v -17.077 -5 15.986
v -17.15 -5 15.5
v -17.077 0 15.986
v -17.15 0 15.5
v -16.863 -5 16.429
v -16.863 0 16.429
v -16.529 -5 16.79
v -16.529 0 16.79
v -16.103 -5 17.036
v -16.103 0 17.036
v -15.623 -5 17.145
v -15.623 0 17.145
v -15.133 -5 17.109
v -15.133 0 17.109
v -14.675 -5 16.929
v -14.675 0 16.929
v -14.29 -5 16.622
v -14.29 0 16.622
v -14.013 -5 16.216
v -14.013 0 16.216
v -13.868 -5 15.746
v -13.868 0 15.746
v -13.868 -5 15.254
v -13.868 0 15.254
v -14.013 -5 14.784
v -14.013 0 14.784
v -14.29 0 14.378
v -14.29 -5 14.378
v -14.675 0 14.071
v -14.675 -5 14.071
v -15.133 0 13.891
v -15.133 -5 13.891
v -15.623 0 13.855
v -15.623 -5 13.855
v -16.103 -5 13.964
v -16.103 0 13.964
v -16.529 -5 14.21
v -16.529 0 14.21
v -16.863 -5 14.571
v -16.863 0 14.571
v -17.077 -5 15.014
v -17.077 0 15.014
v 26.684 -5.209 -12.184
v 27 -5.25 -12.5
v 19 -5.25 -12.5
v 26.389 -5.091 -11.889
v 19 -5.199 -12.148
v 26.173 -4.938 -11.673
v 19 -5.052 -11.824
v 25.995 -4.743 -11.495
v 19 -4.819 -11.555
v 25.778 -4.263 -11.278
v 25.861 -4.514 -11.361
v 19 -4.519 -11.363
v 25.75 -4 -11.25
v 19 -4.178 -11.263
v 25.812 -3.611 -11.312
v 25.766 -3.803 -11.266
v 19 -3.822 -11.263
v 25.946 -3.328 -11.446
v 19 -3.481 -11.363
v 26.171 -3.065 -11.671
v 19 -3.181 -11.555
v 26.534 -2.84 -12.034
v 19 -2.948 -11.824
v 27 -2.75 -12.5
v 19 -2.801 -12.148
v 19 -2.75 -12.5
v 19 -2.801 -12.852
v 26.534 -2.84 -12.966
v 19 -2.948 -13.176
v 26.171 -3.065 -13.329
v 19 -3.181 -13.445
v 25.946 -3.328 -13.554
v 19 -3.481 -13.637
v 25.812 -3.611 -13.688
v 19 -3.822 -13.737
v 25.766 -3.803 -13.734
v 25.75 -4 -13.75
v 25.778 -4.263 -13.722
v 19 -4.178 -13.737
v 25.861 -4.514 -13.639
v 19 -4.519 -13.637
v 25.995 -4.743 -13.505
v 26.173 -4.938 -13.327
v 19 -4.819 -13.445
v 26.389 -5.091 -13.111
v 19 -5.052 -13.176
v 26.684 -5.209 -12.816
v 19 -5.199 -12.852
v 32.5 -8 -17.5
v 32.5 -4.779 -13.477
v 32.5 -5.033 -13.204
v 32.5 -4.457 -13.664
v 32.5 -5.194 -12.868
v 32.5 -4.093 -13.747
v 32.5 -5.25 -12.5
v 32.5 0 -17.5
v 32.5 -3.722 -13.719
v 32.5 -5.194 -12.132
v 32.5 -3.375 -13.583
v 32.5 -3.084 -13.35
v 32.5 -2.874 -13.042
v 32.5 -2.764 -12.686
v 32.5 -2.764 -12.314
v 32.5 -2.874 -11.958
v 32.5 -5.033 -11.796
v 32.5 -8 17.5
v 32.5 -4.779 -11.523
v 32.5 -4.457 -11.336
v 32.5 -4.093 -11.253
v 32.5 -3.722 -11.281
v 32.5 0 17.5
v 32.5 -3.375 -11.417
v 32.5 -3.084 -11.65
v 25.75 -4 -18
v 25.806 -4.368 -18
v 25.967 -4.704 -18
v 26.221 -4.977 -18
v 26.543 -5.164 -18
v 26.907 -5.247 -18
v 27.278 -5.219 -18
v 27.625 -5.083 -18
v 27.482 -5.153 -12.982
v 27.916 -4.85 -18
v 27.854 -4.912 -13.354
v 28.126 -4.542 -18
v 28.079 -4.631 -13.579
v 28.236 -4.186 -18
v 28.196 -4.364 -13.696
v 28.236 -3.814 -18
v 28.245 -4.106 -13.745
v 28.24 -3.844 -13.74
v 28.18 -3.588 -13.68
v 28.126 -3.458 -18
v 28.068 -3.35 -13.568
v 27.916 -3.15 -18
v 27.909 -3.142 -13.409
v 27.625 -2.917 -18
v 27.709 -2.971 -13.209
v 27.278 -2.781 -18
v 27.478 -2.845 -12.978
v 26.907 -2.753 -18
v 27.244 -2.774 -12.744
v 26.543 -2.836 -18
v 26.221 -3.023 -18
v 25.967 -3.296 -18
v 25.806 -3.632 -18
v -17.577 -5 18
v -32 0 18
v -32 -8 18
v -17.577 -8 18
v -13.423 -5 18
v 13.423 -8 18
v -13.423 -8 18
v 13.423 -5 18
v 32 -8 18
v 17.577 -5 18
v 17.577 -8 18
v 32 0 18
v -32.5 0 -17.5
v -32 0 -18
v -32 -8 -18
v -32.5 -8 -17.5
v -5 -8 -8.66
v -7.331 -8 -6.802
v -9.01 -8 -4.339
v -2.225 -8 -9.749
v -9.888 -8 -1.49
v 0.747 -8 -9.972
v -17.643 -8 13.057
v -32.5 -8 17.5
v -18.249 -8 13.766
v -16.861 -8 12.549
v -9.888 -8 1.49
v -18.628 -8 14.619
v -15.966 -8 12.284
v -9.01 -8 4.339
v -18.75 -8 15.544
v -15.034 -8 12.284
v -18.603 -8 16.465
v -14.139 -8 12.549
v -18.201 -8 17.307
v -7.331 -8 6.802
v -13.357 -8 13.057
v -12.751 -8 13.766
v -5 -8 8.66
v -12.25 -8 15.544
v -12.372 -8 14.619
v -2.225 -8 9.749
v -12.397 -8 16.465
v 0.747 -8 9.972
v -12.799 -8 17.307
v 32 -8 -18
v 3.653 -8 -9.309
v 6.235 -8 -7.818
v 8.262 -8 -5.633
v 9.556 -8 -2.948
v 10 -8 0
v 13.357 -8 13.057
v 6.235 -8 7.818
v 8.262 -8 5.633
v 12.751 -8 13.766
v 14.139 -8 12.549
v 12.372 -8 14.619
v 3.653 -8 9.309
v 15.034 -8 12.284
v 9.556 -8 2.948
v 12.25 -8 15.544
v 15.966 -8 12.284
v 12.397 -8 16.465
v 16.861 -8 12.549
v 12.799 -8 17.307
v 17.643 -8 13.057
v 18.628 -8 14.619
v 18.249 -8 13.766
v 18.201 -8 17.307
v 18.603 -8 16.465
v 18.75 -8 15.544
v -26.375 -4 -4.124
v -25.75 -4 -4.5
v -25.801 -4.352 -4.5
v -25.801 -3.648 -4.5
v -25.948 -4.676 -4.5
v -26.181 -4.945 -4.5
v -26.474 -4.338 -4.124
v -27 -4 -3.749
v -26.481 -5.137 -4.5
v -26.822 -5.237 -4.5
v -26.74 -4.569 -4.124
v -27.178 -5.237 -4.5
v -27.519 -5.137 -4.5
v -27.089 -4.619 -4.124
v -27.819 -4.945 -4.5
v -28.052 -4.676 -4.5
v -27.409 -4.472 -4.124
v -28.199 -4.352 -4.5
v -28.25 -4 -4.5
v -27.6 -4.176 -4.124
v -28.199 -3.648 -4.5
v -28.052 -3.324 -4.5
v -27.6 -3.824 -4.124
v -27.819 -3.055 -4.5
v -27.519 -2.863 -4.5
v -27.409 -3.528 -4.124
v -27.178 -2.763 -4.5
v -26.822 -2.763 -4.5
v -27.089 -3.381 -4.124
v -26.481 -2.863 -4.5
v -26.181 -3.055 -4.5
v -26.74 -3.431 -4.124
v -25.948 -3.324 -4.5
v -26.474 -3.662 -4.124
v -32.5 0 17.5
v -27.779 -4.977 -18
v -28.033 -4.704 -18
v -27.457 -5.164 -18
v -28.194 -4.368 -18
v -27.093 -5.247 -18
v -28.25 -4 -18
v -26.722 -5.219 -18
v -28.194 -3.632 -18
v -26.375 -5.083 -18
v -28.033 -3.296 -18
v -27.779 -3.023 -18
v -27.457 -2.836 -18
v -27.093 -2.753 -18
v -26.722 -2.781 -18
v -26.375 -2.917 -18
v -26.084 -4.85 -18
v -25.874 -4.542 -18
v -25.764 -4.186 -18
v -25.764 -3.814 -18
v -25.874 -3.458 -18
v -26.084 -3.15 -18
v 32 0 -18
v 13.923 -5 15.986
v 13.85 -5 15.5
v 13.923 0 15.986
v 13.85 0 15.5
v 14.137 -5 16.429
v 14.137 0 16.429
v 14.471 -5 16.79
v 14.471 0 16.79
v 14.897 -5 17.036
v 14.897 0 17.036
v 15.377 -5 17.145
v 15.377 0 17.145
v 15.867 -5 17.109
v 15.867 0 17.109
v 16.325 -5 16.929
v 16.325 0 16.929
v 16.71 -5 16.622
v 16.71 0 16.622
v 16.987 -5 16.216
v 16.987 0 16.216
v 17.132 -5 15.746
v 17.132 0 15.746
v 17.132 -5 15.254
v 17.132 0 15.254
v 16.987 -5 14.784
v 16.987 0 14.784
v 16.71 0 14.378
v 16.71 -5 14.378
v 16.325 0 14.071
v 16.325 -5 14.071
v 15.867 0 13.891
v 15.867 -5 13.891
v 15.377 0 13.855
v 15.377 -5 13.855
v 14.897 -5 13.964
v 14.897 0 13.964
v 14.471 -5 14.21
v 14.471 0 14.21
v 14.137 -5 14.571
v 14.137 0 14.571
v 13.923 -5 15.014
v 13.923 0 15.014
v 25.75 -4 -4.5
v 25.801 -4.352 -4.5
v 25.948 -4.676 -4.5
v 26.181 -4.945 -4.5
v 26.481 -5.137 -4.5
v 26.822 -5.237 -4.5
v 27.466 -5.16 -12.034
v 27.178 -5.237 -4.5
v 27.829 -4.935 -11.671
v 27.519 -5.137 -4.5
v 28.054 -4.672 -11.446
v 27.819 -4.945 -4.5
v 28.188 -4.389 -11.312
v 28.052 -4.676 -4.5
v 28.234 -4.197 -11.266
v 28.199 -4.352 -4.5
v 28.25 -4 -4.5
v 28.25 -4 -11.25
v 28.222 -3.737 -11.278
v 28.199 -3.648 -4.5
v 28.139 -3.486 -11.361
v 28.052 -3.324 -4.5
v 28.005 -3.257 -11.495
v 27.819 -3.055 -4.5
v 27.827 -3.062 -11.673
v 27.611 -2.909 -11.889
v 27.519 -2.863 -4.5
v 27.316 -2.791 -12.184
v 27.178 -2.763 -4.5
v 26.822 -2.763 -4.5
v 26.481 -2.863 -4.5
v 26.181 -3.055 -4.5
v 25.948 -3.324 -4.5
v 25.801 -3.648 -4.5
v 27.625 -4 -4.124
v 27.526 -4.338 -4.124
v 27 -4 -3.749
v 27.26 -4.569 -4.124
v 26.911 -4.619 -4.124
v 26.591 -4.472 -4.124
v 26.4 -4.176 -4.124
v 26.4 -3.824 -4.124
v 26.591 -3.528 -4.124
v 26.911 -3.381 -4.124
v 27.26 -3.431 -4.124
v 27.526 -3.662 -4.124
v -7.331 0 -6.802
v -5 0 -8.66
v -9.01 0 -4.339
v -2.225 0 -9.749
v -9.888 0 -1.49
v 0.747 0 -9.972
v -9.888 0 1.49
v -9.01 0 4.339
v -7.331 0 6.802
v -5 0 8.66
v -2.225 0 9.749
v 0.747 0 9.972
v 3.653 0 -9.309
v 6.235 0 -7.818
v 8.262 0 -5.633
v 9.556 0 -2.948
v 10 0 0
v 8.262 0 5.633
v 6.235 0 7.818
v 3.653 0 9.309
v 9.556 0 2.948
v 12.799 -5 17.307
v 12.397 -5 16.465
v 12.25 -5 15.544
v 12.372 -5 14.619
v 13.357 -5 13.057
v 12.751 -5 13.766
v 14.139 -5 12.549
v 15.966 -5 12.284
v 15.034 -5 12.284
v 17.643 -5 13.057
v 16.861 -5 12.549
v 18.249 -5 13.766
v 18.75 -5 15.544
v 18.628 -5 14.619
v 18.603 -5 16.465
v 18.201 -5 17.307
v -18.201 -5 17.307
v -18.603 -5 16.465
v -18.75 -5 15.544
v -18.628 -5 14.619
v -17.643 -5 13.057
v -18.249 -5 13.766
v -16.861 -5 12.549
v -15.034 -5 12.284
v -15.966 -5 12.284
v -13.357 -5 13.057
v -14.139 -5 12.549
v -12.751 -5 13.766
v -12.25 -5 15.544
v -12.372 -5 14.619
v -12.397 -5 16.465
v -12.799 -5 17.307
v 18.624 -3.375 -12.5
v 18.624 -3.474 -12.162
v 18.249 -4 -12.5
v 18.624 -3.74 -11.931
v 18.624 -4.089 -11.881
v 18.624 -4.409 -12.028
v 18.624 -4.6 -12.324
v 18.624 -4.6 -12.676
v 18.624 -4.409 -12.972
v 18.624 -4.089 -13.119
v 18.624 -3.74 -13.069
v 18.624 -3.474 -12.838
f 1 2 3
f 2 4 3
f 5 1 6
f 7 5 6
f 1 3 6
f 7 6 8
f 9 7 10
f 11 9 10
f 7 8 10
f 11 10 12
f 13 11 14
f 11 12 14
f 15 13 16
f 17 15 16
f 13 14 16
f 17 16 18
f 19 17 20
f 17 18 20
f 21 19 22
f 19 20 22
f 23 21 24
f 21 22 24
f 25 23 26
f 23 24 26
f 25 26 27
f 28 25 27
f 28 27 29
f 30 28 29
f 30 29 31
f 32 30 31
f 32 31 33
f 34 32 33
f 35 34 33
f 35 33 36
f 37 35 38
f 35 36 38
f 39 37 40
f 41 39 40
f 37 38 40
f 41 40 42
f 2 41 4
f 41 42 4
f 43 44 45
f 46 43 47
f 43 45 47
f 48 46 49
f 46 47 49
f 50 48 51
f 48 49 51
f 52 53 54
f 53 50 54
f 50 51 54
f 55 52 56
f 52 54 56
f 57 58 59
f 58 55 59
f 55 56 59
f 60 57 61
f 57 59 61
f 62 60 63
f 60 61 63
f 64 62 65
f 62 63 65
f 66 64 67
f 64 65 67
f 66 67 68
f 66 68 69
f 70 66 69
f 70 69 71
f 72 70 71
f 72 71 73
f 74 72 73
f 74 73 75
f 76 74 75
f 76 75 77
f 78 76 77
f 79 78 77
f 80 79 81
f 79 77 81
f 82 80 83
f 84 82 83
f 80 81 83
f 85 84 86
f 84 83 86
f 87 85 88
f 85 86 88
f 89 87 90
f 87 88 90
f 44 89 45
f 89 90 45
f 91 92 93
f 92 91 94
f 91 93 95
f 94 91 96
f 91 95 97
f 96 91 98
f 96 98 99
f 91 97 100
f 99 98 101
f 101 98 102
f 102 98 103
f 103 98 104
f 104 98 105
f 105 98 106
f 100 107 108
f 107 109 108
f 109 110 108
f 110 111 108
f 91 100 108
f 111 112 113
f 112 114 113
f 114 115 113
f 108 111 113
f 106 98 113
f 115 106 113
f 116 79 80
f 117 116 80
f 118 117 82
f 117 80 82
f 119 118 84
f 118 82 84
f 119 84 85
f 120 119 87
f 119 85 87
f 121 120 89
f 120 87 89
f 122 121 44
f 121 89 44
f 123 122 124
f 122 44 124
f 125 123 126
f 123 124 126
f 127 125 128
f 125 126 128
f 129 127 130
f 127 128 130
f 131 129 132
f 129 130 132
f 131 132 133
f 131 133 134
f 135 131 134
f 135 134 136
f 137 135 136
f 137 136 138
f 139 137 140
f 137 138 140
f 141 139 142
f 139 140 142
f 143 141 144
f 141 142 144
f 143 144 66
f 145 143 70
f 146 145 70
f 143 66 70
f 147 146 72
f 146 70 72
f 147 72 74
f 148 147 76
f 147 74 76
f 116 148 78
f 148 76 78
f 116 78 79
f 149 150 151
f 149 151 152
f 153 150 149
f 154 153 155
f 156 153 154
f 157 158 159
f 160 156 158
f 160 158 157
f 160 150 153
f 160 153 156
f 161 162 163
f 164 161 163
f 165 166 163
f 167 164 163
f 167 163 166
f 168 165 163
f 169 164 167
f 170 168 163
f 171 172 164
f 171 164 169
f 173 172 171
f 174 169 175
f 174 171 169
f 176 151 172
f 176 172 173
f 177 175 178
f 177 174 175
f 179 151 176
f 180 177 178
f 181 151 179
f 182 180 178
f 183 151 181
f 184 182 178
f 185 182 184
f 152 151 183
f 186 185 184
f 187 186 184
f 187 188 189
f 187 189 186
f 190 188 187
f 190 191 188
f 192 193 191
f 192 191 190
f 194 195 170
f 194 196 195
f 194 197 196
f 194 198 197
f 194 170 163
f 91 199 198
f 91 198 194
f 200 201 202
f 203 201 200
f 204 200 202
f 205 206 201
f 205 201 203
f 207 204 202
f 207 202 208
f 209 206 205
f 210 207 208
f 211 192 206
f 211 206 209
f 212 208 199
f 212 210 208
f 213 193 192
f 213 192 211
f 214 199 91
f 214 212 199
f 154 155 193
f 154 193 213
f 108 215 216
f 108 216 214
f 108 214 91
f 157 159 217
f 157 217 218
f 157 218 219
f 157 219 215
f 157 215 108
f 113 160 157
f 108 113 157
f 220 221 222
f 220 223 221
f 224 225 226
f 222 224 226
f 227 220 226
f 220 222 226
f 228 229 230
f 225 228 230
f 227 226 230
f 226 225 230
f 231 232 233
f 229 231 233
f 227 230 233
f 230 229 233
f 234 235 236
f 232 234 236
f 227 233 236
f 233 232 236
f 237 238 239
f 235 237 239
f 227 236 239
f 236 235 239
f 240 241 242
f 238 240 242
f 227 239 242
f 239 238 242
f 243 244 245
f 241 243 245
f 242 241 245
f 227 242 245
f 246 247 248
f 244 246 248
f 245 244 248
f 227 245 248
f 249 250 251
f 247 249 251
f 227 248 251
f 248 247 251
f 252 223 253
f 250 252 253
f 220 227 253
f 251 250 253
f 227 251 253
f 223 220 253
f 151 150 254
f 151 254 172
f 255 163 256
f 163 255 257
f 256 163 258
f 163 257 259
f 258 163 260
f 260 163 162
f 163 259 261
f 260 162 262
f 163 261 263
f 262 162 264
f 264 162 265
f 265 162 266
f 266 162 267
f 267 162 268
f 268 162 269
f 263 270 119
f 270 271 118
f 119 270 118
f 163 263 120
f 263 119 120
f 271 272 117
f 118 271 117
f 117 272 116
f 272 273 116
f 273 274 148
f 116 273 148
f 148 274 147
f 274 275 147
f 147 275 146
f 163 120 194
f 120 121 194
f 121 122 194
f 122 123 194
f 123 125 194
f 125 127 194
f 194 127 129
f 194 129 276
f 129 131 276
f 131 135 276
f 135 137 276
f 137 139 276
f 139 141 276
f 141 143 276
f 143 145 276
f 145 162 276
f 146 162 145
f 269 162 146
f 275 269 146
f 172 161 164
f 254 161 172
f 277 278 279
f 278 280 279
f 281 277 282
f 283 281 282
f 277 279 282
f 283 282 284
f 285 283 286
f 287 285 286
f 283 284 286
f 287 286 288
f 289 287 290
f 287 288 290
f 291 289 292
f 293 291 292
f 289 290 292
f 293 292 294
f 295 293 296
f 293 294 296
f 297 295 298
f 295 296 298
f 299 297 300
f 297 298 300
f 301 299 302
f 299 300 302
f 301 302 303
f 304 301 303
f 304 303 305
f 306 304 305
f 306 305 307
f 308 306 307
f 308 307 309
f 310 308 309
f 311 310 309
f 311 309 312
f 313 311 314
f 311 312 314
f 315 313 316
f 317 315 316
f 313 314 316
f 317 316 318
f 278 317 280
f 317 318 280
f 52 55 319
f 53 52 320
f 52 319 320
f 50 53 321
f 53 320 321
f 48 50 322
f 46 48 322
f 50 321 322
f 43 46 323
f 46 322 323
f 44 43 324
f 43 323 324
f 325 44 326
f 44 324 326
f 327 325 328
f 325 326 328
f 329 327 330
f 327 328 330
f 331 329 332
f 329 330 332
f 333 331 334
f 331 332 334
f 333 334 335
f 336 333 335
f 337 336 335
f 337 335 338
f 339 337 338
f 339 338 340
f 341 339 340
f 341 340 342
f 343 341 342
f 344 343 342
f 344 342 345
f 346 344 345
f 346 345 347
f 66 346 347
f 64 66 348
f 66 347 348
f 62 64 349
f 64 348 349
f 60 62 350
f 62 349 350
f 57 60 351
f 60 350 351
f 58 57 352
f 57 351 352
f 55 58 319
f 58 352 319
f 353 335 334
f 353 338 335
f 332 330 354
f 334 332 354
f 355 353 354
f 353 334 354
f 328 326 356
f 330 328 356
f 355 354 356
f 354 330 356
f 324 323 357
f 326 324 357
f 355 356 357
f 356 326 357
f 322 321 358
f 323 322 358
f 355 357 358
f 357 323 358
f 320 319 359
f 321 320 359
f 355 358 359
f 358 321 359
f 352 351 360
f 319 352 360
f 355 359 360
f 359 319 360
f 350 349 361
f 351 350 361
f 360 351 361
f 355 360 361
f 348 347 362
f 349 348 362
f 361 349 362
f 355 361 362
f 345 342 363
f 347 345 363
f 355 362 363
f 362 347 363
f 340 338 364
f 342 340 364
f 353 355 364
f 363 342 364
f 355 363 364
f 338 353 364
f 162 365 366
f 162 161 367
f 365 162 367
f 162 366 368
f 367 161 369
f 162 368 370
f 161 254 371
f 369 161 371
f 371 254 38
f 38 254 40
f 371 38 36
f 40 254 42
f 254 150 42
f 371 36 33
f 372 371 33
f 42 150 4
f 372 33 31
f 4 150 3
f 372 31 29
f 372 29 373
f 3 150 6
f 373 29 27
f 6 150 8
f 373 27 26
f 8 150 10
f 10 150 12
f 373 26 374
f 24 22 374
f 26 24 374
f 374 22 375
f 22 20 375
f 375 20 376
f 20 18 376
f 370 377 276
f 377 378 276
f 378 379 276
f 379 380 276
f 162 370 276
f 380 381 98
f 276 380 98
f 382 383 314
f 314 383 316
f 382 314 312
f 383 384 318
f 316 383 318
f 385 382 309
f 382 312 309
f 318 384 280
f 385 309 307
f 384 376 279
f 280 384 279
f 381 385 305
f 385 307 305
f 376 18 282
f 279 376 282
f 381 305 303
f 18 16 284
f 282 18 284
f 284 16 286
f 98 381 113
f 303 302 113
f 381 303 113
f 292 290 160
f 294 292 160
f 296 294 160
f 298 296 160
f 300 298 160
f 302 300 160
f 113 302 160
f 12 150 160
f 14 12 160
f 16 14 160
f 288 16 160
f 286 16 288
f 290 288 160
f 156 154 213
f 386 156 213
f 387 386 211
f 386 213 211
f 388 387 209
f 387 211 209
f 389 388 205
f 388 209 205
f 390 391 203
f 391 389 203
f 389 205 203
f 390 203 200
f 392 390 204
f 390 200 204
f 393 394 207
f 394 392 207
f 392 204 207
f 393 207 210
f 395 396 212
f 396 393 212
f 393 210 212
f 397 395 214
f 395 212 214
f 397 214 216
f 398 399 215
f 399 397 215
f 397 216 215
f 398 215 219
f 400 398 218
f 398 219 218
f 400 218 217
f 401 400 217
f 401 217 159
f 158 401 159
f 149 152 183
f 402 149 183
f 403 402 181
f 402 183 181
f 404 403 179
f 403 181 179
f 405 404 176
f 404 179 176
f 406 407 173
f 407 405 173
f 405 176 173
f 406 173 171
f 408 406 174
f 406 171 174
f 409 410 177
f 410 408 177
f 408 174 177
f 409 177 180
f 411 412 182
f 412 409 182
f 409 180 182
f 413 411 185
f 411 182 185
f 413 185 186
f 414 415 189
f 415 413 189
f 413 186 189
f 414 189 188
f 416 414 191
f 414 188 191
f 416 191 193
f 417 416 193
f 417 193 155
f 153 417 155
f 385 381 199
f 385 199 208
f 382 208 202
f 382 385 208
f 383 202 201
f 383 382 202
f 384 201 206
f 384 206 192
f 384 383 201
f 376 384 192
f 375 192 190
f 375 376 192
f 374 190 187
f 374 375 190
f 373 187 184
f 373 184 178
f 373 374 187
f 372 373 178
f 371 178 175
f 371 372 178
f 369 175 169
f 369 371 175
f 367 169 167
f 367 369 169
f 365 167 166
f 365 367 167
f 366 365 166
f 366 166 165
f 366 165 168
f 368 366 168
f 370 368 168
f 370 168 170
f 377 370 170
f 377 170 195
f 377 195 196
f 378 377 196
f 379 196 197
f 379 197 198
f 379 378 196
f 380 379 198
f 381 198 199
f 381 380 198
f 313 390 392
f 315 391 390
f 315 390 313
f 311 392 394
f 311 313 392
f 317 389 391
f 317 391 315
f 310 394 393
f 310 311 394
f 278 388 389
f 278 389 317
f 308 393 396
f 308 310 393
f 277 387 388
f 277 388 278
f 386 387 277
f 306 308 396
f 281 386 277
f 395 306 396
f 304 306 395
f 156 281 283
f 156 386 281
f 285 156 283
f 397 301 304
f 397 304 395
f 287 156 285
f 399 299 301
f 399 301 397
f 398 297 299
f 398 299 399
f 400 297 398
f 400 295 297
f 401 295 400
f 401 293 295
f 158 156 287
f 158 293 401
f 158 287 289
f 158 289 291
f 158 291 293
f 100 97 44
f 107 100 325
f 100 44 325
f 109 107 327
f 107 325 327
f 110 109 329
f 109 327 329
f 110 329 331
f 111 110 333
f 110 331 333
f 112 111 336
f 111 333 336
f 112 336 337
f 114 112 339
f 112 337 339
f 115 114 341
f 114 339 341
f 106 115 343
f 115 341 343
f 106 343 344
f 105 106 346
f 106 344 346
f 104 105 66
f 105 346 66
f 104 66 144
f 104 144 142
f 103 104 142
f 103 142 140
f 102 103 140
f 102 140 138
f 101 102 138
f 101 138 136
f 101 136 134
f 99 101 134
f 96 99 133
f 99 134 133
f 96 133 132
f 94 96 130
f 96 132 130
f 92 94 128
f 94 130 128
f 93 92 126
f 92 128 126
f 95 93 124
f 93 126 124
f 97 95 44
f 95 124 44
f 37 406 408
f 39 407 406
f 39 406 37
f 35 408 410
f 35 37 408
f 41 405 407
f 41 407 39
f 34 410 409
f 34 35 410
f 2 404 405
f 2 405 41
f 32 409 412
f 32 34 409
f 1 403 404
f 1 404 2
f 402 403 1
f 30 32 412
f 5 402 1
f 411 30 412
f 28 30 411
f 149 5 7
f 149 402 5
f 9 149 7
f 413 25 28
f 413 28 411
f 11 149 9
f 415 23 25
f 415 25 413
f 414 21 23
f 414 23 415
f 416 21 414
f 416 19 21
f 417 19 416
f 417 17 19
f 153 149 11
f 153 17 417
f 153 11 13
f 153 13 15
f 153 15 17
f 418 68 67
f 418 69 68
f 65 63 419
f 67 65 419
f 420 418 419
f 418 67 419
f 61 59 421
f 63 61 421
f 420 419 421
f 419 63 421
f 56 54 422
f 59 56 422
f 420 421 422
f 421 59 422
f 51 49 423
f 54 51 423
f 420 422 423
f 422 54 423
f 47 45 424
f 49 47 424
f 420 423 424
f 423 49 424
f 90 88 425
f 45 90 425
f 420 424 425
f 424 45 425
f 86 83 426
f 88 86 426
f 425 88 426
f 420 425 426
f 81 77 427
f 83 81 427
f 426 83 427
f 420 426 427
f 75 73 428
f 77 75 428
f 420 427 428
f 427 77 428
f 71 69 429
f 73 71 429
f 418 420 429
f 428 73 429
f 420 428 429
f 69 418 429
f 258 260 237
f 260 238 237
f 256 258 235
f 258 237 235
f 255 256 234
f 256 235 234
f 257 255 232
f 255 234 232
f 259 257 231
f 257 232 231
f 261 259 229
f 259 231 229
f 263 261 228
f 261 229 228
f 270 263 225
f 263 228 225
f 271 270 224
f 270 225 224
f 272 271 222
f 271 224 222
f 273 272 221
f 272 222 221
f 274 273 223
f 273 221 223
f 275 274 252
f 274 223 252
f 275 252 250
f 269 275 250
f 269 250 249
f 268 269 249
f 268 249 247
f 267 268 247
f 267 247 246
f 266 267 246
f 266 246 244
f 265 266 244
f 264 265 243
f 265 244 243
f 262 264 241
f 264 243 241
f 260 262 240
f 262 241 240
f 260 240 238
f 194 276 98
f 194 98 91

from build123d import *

# Parameters (mm, degrees)
F0_W           = 65
F0_H           = 36
F0_R           = 10
F1_DEPTH       = 8
F3_D           = 3.3
F3_CBORE_D     = 6.5
F3_CBORE_DEPTH = 3
F4_SIZE        = 0.5
F6_D           = 2.5
F6_DEPTH       = 13.5
F6_TIP         = 0.7510757738
F8_D           = 2.5
F8_DEPTH       = 13.5
F8_TIP         = 0.7510757738


with BuildPart() as f1:
    # F0 (on Front) → F1 (new body)
    with BuildSketch(Plane.XZ):
        Rectangle(F0_W, F0_H)
        Circle(F0_R, mode=Mode.SUBTRACT)
    extrude(amount=F1_DEPTH)

    # F3 (through all)
    with Locations(Plane.XZ.offset(8)):
        with Locations((15.5, 15.5), (-15.5, 15.5)):
            CounterBoreHole(F3_D / 2, F3_CBORE_D / 2, F3_CBORE_DEPTH)

    # F4
    f4_edges = [f1.edges().sort_by_distance(p)[0] for p in [
        (-32.5, -4, 18),
        (32.5, -4, 18),
        (32.5, -4, -18),
        (-32.5, -4, -18),
    ]]
    chamfer(f4_edges, length=F4_SIZE)

    # F6
    with Locations(Plane(origin=(0, 0, -18), x_dir=(1, 0, 0), z_dir=(0, 0, -1))):
        with Locations((27, 4), (-27, 4)):
            Hole(F6_D / 2, depth=F6_DEPTH)
            with Locations((0, 0, -(F6_DEPTH + F6_TIP / 2))):  # 118° drill point
                Cone(0, F6_D / 2, F6_TIP, mode=Mode.SUBTRACT)

    # F8
    with Locations(Plane.YZ.offset(32.5)):
        with Locations((-4, -12.5)):
            Hole(F8_D / 2, depth=F8_DEPTH)
            with Locations((0, 0, -(F8_DEPTH + F8_TIP / 2))):  # 118° drill point
                Cone(0, F8_D / 2, F8_TIP, mode=Mode.SUBTRACT)


solid = f1.part
